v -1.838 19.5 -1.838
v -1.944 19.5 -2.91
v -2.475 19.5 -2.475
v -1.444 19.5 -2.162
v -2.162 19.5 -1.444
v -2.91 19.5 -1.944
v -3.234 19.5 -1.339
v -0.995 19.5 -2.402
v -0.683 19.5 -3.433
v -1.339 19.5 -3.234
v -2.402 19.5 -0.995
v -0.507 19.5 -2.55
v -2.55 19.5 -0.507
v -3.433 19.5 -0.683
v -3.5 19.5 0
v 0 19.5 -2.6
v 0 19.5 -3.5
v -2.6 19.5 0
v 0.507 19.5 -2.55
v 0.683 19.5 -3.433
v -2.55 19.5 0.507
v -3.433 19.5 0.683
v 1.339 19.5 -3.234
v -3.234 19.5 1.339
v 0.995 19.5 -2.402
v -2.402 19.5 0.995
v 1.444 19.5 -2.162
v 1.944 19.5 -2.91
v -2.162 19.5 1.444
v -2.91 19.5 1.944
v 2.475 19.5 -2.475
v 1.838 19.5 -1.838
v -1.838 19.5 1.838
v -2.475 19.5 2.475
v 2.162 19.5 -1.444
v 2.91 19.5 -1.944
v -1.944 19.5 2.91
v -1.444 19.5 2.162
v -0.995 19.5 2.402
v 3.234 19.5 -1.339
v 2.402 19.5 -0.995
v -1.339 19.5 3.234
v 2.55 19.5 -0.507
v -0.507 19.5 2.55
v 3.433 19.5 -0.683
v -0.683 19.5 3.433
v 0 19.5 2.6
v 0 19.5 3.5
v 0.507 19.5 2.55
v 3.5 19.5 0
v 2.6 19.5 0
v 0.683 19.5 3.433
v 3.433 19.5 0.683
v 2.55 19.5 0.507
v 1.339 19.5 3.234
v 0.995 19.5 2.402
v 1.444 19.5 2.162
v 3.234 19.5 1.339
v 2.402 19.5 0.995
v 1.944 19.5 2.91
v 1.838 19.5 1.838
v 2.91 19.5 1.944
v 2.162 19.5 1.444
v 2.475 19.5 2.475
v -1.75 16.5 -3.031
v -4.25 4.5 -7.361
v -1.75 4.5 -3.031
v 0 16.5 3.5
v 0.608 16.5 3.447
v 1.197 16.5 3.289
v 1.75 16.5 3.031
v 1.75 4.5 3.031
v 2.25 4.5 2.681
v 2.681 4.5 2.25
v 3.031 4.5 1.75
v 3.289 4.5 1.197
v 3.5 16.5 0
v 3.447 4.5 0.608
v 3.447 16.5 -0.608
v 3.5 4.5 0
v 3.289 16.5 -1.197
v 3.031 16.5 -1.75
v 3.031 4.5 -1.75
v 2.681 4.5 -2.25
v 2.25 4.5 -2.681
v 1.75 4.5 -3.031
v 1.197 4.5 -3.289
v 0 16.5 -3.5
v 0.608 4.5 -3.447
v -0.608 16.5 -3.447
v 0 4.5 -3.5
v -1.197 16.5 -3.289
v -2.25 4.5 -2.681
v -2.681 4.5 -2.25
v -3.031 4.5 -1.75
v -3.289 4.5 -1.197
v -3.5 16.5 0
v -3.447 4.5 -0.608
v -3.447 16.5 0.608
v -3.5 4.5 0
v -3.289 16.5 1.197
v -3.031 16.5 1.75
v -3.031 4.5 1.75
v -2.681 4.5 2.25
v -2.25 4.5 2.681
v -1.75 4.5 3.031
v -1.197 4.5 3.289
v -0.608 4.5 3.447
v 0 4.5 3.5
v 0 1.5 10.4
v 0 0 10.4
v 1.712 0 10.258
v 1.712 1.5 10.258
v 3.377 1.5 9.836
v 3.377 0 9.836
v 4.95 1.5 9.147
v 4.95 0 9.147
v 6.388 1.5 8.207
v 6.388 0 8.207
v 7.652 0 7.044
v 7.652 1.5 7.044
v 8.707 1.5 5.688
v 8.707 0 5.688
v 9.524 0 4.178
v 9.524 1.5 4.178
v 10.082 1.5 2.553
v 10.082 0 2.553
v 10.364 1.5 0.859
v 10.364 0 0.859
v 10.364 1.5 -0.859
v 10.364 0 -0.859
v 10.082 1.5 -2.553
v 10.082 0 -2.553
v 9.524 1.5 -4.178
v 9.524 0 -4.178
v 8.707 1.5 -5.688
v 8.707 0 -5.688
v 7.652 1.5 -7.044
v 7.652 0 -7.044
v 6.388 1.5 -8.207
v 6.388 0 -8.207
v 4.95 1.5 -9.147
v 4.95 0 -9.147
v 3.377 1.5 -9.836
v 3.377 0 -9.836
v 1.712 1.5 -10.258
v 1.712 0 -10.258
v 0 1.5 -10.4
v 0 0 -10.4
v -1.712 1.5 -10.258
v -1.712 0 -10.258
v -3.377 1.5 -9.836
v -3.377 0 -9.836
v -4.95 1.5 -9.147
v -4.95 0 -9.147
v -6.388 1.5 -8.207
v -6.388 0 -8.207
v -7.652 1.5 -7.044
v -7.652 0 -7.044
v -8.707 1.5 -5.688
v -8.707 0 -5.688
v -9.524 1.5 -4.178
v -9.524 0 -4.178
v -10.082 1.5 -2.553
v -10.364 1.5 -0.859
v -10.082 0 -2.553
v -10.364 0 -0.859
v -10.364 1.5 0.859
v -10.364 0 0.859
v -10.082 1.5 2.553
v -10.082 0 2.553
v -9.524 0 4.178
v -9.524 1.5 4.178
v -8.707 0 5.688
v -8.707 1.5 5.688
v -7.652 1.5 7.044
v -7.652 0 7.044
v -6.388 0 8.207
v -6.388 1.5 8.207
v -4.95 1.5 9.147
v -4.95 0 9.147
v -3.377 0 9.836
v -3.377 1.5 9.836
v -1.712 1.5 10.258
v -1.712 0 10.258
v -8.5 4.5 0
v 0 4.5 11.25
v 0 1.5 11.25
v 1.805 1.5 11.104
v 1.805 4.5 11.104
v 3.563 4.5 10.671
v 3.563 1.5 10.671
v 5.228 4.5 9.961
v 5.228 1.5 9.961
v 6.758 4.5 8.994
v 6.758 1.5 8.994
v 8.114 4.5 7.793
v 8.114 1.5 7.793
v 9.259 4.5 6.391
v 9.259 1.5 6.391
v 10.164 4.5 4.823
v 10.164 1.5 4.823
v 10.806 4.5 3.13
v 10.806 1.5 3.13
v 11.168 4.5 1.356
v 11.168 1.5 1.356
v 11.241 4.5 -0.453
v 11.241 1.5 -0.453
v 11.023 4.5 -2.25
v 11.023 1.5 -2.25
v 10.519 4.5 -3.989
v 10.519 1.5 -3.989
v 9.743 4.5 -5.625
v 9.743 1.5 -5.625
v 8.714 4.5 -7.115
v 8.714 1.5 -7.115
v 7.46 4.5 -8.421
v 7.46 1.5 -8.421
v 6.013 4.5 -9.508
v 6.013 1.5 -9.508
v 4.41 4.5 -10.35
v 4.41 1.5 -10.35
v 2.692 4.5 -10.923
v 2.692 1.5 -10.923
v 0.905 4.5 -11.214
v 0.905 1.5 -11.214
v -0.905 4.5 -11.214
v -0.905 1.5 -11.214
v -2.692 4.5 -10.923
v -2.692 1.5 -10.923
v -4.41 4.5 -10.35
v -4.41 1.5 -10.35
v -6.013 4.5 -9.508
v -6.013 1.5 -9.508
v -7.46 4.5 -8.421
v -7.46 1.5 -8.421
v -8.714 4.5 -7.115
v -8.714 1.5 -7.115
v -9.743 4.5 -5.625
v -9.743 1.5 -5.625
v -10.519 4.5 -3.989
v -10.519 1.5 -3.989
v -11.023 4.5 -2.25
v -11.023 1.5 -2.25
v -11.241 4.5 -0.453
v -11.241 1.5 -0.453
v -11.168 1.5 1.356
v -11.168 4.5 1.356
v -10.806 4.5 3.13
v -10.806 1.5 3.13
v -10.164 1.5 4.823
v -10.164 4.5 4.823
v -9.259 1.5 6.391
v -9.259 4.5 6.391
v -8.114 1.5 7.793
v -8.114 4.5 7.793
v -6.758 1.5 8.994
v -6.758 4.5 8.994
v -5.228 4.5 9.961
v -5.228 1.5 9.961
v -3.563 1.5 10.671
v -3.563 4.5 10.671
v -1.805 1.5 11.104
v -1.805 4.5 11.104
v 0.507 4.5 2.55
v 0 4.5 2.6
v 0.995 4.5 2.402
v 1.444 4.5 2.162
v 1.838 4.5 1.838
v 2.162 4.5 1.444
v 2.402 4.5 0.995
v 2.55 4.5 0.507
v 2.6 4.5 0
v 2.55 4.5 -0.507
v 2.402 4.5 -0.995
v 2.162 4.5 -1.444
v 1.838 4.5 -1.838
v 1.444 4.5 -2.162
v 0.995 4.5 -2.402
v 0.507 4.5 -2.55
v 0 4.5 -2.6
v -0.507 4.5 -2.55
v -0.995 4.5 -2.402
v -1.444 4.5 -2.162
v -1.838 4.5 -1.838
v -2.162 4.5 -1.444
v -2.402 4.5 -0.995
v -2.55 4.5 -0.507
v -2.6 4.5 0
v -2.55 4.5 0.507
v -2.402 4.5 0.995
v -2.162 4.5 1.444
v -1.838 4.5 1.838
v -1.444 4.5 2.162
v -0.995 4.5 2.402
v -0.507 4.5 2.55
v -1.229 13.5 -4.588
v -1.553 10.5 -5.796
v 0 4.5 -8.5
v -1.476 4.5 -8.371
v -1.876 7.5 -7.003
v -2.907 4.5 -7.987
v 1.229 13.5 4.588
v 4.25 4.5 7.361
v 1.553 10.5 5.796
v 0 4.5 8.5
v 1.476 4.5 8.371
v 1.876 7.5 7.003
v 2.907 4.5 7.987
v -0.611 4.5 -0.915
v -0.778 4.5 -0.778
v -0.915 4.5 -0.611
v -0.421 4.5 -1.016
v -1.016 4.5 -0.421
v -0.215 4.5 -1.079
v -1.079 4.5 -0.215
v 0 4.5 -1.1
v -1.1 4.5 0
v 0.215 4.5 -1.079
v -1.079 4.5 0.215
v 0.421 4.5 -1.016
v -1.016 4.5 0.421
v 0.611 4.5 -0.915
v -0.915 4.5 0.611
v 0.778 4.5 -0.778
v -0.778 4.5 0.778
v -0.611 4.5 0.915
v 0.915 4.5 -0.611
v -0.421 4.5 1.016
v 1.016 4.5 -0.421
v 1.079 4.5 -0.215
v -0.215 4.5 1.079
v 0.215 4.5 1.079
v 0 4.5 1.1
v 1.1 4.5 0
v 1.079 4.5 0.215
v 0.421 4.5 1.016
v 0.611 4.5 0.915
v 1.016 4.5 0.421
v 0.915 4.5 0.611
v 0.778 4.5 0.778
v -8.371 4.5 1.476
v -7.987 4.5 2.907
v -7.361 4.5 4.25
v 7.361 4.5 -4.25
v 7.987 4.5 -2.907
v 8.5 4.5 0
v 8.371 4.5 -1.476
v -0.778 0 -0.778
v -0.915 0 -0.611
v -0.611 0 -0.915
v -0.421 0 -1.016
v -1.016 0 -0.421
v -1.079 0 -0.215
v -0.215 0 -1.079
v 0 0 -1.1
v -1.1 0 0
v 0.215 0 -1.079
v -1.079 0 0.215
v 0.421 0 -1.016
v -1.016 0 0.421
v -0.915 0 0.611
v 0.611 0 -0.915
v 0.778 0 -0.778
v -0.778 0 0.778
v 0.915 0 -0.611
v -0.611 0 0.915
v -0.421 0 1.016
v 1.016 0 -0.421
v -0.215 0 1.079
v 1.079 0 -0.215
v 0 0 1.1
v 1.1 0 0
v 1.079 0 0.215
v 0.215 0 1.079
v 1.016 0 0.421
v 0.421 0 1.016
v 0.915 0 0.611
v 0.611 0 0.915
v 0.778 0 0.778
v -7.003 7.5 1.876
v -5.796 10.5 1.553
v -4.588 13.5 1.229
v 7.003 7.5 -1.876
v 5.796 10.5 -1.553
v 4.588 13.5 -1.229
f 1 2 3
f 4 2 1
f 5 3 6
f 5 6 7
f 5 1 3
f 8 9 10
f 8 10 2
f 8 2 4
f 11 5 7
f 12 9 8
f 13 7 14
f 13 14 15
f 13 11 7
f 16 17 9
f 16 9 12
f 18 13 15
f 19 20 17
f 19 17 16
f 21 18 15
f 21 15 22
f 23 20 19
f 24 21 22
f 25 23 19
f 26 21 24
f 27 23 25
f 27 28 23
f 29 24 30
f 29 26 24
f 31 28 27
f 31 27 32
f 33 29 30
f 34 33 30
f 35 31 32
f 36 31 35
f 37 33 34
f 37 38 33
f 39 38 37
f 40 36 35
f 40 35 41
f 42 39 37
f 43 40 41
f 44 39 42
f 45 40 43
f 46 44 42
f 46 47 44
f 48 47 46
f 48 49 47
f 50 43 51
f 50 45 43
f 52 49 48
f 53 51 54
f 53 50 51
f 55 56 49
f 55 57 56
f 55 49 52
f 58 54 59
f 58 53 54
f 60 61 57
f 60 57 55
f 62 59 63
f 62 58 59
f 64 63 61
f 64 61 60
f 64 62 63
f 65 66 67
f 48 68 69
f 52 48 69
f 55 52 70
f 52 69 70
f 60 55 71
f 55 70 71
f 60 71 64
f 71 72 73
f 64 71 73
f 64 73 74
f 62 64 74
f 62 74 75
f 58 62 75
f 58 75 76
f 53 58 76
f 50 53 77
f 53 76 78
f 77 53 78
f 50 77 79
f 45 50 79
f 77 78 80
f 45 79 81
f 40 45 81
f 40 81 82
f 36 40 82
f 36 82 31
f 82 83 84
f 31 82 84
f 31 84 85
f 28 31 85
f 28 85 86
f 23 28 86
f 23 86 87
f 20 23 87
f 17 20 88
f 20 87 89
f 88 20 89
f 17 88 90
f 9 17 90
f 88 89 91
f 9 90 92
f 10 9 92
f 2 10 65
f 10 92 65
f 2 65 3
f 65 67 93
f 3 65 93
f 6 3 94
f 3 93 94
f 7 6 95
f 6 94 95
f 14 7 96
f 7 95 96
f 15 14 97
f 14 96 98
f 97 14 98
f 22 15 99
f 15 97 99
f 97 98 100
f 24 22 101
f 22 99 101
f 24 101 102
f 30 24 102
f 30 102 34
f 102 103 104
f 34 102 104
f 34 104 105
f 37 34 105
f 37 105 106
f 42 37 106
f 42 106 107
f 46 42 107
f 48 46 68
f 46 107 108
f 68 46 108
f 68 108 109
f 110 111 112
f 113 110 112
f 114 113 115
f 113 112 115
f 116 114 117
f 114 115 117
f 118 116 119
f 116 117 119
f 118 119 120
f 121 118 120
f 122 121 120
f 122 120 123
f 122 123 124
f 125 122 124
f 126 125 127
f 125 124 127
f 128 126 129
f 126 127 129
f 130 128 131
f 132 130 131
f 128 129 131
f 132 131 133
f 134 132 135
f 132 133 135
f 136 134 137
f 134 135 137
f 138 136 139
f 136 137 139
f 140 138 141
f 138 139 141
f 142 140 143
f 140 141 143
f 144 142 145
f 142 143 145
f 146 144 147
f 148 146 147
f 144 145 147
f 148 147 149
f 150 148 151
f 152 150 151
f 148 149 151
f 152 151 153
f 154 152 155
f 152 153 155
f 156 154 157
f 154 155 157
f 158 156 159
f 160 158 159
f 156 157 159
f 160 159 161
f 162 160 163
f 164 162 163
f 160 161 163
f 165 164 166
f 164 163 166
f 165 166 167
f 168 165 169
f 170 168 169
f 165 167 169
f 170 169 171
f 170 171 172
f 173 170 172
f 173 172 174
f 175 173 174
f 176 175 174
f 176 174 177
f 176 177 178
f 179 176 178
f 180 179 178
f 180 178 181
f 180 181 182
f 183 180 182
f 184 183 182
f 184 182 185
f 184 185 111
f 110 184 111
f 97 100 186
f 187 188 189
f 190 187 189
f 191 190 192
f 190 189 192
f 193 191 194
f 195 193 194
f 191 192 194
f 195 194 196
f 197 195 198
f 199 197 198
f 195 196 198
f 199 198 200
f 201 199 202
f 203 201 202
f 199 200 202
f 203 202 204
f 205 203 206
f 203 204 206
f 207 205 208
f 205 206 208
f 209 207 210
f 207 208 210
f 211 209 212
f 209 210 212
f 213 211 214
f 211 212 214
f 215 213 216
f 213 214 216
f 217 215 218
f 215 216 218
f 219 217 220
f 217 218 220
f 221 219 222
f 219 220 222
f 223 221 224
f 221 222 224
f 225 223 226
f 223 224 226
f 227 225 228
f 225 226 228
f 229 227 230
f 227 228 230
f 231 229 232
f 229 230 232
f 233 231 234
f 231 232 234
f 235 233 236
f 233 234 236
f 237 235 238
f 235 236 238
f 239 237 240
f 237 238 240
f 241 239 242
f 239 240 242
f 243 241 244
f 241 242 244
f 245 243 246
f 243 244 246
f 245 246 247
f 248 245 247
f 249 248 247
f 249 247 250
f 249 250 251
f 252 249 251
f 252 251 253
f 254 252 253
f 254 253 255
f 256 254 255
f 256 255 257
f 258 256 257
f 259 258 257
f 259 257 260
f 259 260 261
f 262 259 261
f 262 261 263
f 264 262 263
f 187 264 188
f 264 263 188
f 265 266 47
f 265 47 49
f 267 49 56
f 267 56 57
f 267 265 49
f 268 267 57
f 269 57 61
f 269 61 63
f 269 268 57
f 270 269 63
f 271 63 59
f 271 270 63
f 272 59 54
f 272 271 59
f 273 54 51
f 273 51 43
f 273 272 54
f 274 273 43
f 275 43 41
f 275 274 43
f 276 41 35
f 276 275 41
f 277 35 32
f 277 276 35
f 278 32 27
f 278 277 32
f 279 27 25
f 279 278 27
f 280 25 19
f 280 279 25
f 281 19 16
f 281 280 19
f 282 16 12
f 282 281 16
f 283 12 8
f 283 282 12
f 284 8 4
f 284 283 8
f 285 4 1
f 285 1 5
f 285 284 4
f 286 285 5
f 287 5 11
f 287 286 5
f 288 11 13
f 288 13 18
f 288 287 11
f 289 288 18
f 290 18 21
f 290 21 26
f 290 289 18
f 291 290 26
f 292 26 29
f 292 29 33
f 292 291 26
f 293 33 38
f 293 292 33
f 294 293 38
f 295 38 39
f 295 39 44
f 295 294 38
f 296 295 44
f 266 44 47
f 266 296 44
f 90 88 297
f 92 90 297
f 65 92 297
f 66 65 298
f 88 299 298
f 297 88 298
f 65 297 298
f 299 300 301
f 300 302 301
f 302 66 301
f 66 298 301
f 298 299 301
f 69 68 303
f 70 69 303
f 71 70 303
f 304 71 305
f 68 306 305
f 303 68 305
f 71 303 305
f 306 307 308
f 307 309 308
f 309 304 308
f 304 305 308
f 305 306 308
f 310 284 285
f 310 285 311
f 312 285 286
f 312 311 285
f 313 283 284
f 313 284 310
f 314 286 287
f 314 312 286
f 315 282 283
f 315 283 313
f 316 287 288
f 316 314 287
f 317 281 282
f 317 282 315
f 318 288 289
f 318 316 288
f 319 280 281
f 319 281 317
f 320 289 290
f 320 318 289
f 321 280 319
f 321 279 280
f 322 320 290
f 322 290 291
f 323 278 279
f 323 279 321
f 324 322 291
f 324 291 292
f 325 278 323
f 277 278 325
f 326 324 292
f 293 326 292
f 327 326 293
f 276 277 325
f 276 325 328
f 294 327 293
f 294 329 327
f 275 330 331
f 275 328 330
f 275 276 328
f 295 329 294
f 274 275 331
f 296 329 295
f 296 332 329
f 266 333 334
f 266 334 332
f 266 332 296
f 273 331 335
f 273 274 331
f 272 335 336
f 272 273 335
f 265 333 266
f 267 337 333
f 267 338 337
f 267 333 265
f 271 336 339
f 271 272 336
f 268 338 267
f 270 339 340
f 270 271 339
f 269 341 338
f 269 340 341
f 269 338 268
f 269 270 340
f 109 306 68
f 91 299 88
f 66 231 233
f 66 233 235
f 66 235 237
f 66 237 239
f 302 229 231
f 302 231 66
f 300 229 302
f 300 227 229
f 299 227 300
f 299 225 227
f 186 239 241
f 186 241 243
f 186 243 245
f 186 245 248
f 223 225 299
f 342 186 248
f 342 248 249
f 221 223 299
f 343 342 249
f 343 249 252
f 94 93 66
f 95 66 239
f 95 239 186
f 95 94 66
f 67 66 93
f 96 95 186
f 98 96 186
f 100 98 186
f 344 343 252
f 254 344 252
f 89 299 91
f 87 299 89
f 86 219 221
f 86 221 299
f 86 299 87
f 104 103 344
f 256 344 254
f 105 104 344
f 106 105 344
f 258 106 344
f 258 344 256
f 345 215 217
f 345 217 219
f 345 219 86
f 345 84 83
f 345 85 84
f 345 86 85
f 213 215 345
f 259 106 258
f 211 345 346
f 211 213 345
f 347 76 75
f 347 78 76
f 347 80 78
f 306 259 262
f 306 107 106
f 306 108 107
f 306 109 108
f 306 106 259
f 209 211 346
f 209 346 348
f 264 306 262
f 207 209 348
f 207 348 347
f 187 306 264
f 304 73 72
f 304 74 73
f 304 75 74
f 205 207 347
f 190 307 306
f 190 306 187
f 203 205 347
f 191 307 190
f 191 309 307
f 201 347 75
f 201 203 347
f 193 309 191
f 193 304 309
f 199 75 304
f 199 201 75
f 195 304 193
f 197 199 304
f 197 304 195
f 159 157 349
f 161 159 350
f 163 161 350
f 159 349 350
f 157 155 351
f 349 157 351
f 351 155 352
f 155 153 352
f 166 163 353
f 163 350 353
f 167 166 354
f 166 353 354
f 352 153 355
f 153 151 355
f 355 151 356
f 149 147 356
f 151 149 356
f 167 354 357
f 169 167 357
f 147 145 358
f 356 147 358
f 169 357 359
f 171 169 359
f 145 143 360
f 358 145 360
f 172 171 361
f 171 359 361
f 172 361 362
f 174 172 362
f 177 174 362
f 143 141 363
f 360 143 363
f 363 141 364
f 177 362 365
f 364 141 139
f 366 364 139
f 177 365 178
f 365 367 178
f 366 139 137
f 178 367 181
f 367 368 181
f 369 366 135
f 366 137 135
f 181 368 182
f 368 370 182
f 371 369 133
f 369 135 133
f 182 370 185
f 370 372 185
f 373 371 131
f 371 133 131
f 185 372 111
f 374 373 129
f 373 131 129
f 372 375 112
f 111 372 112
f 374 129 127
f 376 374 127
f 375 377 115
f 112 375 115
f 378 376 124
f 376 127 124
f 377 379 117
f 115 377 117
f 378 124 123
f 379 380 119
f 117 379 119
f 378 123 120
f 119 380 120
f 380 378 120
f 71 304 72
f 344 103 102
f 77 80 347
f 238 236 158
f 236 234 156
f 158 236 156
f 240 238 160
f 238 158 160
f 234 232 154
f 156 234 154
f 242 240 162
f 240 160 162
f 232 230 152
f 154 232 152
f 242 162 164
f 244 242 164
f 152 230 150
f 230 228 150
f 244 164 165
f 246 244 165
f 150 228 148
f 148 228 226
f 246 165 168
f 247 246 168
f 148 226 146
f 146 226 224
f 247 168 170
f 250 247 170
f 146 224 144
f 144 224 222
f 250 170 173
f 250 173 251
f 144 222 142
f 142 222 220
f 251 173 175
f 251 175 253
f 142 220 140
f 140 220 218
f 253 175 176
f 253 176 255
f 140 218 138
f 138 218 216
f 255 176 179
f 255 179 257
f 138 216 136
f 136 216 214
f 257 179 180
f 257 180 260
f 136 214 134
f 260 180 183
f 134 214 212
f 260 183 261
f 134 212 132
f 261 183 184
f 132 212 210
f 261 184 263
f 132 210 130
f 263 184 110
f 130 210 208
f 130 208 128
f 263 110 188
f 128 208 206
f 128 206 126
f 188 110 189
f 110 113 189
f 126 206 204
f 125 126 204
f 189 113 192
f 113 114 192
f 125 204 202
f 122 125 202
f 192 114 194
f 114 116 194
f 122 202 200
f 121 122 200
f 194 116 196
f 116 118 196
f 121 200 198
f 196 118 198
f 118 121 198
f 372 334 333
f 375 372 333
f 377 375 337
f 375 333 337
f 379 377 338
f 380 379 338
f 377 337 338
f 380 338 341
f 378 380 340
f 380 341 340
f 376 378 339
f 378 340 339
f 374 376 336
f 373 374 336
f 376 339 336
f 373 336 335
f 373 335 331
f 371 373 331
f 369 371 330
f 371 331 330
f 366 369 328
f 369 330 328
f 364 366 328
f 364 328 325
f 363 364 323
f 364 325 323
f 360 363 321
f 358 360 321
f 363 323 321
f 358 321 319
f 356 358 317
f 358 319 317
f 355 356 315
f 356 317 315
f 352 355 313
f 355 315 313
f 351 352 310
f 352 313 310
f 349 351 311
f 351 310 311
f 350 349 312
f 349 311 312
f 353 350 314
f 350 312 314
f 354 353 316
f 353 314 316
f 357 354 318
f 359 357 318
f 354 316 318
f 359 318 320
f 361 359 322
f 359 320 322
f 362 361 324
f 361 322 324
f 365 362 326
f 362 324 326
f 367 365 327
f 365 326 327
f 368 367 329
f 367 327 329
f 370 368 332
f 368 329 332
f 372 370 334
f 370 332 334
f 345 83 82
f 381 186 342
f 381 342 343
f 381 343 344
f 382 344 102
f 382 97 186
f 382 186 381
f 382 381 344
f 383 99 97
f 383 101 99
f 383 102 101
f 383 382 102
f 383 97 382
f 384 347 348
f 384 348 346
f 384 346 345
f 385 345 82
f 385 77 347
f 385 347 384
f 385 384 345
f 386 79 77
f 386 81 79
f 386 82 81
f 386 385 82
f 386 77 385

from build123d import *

# Parameters (mm, degrees)
SKETCH_1_R          = 10.4
EXTRUDE_1_DEPTH     = 1.5
SKETCH_2_R          = 11.25
EXTRUDE_2_DEPTH     = 3
SKETCH_3_R          = 3.5
SKETCH_3_R_2        = 2.6
EXTRUDE_3_DEPTH     = 15
SKETCH_3_4_R        = 1.1
CUT_EXTRUDE_2_DEPTH = 4.5
REVOLVE_3_ANGLE     = 30
REVOLVE_4_ANGLE     = 30


with BuildPart() as part:
    # 草图1 → 凸台-拉伸1 (new body)
    with BuildSketch(Plane(origin=(0, 0, 0), x_dir=(1, 0, 0), z_dir=(0, 1, 0))):
        with Locations(Location((0, 0, 0), (0, 0, 270))):
            Circle(SKETCH_1_R)
    extrude(amount=EXTRUDE_1_DEPTH)

    # 草图2 → 凸台-拉伸2 (add)
    with BuildSketch(Plane(origin=(0, 1.5, 0), x_dir=(1, 0, 0), z_dir=(0, 1, 0))):
        with Locations(Location((0, 0, 0), (0, 0, 270))):
            Circle(SKETCH_2_R)
    extrude(amount=EXTRUDE_2_DEPTH)

    # 草图3 → 凸台-拉伸3 (add)
    with BuildSketch(Plane(origin=(0, 4.5, 0), x_dir=(1, 0, 0), z_dir=(0, 1, 0))):
        with Locations(Location((0, 0, 0), (0, 0, 270))):
            Circle(SKETCH_3_R)
        with Locations(Location((0, 0, 0), (0, 0, 270))):
            Circle(SKETCH_3_R_2, mode=Mode.SUBTRACT)
    extrude(amount=EXTRUDE_3_DEPTH)

    # 草图3<4> → 切除-拉伸2 (cut)
    with BuildSketch(Plane(origin=(0, 4.5, 0), x_dir=(1, 0, 0), z_dir=(0, 1, 0))):
        with Locations(Location((0, 0, 0), (0, 0, 270))):
            Circle(SKETCH_3_4_R)
    extrude(amount=-CUT_EXTRUDE_2_DEPTH, mode=Mode.SUBTRACT)

    # 草图6 → 旋转3 (revolve)
    with BuildSketch(Plane(origin=(0, 0, 0), x_dir=(0, 0, -1), z_dir=(1, 0, 0))):
        Polygon((3.5, 4.5), (3.5, 16.5), (8.5, 4.5), align=None)
        Polygon((-8.5, 4.5), (-3.5, 4.5), (-3.5, 16.5), align=None)
    revolve(axis=Axis((0, 0, 0), (0, 1, 0)), revolution_arc=REVOLVE_3_ANGLE)

    # 草图9 → 旋转4 (revolve)
    with BuildSketch(Plane.XY):
        Polygon((3.5, 4.5), (8.5, 4.5), (3.5, 16.5), align=None)
        Polygon((-8.5, 4.5), (-3.5, 16.5), (-3.5, 4.5), align=None)
    revolve(axis=Axis((0, 0, 0), (0, 1, 0)), revolution_arc=REVOLVE_4_ANGLE)


solid = part.part
